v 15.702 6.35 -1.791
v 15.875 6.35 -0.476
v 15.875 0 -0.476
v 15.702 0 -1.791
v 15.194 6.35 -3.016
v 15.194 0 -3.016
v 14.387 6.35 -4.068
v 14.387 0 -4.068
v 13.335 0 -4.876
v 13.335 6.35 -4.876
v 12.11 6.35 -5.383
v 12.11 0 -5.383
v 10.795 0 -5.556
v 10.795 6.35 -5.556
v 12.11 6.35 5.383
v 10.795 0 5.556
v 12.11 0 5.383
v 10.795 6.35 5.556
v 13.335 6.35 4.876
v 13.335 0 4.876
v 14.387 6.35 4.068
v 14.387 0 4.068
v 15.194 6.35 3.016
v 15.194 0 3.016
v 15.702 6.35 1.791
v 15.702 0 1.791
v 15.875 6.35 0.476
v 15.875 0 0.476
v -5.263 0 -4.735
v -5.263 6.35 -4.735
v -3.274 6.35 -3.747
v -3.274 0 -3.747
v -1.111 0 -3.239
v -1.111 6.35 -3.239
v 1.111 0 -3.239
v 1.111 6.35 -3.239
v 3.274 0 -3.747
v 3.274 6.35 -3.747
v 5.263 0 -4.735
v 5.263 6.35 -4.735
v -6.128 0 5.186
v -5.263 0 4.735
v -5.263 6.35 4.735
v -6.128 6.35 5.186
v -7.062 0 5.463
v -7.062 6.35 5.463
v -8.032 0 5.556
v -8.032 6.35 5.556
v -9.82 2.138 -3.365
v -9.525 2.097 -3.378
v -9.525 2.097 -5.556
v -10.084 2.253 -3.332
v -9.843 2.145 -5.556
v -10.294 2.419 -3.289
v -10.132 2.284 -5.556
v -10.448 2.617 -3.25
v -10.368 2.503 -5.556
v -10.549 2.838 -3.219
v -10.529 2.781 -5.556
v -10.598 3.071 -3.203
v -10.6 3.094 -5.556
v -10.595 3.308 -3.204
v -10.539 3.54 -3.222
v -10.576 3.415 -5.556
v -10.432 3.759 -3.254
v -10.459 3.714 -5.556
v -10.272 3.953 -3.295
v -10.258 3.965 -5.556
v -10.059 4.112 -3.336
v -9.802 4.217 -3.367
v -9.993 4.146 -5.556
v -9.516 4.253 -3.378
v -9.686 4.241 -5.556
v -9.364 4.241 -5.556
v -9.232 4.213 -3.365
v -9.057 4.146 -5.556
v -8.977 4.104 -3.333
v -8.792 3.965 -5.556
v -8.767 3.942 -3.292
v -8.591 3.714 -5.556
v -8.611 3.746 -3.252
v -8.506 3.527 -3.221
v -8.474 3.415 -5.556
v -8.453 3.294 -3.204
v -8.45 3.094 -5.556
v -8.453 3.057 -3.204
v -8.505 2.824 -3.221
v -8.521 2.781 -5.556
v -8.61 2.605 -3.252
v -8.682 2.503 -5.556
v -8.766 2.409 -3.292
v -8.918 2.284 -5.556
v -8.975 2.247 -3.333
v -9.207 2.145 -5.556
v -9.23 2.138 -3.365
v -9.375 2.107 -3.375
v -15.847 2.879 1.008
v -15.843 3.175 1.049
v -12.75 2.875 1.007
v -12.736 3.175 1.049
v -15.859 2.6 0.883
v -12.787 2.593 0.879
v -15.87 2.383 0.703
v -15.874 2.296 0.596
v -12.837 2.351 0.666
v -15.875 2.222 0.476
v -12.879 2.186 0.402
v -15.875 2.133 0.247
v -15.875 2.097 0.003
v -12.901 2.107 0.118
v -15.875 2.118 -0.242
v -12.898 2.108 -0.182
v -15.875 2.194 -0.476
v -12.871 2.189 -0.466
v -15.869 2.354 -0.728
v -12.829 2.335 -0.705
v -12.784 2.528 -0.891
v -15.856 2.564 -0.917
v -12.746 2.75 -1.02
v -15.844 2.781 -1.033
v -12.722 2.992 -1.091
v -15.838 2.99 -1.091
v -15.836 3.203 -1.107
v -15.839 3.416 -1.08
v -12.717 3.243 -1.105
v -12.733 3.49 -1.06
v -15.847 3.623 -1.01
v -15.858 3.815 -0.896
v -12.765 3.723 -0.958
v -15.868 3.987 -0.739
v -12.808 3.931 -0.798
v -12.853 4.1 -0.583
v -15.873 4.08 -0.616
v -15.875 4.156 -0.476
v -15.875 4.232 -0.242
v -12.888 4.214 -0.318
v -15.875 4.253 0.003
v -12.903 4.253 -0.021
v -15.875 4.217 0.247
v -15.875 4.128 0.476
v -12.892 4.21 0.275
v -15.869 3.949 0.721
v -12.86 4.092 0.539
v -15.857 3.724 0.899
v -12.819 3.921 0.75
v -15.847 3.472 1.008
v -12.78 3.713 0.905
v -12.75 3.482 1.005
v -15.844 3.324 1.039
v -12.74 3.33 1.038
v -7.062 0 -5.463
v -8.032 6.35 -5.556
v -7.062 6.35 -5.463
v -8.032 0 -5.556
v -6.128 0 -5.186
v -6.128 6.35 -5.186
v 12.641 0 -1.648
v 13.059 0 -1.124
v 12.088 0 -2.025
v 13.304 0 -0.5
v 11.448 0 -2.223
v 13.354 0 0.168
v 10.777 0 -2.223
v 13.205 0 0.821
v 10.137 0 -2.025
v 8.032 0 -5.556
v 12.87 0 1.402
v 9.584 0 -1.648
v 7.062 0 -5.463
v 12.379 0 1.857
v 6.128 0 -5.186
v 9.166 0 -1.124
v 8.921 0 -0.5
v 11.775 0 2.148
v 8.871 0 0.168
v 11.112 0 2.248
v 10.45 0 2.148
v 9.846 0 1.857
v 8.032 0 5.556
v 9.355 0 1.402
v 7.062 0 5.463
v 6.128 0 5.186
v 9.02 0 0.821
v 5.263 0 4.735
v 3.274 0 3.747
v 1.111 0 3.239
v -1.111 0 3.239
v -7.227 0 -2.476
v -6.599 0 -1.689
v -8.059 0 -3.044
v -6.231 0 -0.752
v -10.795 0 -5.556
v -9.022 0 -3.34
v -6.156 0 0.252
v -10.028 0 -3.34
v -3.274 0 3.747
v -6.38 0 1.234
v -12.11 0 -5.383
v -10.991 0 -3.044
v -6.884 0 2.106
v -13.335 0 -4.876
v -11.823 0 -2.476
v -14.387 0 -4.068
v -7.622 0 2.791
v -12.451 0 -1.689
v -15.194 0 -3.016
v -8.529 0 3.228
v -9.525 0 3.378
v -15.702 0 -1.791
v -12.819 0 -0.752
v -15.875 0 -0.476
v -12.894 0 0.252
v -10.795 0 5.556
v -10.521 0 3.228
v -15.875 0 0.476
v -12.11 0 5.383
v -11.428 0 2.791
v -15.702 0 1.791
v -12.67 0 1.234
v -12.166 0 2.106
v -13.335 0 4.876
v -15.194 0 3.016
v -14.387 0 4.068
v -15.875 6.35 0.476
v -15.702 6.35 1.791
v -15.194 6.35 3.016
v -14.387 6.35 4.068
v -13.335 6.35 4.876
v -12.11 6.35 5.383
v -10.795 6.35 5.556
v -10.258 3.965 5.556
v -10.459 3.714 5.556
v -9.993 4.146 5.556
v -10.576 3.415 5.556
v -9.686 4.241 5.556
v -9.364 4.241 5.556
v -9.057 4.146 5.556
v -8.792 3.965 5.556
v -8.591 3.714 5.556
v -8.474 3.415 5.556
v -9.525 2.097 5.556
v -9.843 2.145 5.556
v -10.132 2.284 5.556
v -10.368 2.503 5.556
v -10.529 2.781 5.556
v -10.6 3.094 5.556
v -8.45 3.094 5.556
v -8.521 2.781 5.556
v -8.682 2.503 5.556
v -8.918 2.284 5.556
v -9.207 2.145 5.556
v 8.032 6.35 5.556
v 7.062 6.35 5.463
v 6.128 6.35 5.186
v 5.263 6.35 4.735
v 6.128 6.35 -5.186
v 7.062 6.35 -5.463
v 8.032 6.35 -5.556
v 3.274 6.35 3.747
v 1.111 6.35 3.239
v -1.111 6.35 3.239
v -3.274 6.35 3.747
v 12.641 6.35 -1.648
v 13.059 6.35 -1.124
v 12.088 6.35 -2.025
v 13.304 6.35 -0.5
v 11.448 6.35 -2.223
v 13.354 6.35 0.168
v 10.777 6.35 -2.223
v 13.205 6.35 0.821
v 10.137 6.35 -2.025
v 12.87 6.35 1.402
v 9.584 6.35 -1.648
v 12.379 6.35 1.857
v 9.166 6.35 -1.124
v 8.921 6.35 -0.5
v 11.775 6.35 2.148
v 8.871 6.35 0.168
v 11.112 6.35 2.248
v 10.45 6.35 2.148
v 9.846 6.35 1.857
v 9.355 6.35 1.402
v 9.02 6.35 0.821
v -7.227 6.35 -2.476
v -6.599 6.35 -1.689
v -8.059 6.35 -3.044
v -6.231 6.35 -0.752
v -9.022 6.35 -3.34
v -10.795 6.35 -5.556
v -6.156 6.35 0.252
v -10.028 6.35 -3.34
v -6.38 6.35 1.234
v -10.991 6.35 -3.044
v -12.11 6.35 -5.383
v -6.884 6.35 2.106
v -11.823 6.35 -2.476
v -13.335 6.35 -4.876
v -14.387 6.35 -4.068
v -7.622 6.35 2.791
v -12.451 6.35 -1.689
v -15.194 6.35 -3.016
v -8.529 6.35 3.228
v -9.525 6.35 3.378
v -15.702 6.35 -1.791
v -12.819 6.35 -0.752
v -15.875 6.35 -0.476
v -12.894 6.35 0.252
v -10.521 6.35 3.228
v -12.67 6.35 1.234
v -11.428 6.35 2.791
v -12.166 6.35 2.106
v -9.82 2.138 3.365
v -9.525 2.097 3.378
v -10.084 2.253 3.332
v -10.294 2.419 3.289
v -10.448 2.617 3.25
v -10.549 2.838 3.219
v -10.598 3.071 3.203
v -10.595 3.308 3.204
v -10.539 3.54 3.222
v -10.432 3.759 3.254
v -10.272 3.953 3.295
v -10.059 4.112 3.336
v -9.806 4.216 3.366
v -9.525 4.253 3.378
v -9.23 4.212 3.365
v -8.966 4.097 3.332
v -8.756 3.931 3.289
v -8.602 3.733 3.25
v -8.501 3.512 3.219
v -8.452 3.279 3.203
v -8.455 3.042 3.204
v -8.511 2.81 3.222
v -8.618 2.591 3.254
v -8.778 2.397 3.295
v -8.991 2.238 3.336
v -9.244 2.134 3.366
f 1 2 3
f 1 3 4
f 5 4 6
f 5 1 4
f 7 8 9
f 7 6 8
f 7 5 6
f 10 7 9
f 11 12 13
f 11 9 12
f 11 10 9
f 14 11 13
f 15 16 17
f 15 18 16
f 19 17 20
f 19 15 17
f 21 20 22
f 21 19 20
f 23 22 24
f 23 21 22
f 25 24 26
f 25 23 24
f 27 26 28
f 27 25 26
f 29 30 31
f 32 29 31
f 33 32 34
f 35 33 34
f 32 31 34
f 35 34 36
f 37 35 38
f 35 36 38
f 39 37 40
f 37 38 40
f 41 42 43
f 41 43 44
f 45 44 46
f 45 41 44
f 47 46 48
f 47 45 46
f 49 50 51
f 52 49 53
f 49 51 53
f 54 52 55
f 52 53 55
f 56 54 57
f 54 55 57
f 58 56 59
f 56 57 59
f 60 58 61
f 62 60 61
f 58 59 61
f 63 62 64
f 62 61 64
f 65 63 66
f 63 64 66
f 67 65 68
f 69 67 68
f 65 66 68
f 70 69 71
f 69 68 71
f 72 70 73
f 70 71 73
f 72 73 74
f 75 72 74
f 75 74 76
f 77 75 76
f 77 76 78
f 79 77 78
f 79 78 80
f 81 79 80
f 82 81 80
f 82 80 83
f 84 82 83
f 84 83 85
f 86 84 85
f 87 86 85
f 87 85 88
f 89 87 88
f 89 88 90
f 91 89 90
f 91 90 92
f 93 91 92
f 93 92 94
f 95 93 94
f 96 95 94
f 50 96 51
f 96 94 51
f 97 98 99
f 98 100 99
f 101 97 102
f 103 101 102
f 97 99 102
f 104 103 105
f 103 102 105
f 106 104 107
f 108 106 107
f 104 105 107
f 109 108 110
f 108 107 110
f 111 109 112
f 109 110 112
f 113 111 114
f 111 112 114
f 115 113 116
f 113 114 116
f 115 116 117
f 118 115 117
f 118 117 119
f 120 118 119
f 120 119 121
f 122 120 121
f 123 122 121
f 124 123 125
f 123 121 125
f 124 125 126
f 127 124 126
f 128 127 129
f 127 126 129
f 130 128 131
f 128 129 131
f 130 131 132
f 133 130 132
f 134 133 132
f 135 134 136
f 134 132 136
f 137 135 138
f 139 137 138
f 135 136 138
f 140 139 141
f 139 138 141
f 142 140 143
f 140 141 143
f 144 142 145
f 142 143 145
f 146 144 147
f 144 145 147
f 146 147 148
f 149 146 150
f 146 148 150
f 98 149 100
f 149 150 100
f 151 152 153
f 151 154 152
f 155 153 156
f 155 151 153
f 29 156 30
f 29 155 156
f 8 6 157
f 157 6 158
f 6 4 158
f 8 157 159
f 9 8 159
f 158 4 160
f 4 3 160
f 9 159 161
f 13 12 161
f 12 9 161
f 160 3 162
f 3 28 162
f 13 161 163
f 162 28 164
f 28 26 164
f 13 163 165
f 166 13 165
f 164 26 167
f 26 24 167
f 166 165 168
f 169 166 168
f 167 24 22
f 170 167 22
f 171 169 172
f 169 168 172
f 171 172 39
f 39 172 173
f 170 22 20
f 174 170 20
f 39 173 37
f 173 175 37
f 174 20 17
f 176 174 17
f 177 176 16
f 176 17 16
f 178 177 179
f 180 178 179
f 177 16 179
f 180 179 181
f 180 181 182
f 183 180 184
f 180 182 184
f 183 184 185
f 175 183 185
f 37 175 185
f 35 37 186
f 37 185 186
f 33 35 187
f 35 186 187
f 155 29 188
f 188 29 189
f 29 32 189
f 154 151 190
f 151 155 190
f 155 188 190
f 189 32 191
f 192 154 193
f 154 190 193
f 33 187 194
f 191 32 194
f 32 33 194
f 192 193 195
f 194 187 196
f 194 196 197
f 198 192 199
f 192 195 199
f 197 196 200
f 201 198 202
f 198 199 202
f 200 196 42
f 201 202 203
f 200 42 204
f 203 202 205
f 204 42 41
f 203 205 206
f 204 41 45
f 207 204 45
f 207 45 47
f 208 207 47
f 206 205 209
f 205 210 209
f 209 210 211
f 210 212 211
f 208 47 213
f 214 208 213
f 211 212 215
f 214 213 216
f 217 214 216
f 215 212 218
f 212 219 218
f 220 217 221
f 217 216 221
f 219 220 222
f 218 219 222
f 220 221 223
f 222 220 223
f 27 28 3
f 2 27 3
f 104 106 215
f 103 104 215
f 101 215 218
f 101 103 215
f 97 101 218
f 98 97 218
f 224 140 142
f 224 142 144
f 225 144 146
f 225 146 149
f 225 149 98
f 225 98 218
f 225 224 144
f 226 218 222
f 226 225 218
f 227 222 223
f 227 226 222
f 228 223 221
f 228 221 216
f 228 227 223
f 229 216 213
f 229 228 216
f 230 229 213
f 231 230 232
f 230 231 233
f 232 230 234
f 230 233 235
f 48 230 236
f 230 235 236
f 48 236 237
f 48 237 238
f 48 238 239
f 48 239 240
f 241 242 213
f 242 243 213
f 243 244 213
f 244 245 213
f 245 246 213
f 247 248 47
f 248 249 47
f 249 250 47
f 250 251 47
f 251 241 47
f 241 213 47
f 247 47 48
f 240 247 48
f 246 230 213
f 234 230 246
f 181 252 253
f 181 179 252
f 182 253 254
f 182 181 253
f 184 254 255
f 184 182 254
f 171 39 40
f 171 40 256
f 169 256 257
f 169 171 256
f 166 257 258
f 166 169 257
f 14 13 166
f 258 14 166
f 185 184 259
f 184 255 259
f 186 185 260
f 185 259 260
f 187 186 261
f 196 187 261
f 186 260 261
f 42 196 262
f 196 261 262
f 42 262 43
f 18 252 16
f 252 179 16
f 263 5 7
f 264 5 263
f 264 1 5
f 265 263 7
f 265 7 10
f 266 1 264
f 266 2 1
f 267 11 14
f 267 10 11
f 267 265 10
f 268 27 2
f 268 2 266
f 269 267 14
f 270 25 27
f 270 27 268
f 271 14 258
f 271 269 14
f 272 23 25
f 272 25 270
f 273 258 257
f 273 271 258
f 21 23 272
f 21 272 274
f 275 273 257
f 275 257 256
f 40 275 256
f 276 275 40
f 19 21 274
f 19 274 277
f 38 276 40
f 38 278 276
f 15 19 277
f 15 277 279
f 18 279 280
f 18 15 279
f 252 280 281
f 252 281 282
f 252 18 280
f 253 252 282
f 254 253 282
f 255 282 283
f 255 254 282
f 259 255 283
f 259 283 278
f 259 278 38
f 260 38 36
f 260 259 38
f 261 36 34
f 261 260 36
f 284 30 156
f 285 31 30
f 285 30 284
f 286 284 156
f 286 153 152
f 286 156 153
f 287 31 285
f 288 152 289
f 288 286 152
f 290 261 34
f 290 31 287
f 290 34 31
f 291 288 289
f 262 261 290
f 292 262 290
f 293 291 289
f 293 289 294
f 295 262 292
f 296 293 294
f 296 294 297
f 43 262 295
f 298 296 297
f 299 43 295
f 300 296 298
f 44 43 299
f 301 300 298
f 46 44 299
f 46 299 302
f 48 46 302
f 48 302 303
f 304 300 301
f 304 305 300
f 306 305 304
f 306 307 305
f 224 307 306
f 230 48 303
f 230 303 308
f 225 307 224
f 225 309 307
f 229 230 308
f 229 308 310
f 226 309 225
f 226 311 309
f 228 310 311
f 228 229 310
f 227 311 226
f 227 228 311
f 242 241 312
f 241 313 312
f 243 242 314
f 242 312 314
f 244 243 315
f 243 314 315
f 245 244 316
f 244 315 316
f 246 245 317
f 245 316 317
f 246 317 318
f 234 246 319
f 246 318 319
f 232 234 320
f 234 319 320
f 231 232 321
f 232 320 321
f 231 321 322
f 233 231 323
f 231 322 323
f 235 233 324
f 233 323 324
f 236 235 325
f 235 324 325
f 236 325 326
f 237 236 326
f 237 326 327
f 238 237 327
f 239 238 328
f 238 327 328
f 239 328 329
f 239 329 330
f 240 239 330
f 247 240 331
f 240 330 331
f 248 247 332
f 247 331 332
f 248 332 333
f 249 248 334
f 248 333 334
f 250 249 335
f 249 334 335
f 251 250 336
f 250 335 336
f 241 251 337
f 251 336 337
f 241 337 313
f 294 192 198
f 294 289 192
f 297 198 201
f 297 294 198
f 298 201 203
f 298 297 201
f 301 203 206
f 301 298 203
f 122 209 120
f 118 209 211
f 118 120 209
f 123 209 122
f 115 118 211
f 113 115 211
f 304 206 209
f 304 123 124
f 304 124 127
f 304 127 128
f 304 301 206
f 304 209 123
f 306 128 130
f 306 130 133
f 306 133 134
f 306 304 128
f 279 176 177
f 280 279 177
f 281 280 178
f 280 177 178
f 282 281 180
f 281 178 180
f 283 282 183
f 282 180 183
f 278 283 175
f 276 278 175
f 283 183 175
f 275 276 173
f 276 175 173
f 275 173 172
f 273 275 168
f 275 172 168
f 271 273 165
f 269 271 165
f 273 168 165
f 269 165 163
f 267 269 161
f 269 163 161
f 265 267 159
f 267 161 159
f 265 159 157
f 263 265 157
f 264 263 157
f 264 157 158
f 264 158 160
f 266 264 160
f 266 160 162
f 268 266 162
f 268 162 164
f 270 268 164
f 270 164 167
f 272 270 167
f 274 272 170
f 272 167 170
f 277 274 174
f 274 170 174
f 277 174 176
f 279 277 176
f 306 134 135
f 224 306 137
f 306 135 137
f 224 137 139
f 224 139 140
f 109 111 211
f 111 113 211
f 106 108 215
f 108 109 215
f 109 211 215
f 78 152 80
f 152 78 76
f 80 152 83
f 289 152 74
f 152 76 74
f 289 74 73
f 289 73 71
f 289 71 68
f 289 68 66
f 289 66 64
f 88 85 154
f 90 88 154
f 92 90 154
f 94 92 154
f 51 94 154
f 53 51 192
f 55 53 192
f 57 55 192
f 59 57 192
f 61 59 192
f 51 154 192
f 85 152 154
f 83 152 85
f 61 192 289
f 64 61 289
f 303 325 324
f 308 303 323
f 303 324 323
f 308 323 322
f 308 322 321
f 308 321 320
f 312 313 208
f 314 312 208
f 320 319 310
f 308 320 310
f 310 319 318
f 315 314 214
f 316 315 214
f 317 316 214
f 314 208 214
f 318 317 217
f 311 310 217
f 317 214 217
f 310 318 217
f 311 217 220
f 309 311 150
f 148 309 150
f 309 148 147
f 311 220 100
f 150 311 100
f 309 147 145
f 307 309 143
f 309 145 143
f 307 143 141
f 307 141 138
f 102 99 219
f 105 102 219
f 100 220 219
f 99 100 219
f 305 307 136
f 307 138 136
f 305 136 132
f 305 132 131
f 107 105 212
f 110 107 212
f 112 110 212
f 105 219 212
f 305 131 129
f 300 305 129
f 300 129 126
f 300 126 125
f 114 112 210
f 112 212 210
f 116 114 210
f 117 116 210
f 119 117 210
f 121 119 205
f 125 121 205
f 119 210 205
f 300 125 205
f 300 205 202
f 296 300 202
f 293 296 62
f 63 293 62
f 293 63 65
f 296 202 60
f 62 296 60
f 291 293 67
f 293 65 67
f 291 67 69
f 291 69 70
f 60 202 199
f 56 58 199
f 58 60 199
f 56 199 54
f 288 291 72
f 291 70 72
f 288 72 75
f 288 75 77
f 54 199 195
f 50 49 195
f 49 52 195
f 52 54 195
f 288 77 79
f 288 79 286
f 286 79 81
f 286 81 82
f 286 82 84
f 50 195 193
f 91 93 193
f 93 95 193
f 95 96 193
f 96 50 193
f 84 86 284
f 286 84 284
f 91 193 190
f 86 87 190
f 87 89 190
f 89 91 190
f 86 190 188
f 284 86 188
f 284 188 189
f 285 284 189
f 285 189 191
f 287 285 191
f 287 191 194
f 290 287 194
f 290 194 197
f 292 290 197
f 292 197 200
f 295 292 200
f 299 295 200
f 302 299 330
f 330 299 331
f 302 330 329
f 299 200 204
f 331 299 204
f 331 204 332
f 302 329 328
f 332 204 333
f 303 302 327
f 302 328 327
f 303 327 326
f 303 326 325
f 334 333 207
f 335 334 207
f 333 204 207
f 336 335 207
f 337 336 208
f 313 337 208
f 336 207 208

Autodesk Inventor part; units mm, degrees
ref_plane "YZ Plane" through (0, 0, 0) normal (1, 0, 0) x (0, 1, 0)
ref_plane "XZ Plane" through (0, 0, 0) normal (0, 1, 0) x (-1, 0, 0)
ref_plane "XY Plane" through (0, 0, 0) normal (0, 0, 1) x (1, 0, 0)
sketch "Sketch1" plane through (0, 0, 0) normal (0, 1, 0) x (-1, 0, 0)
  line L0 (15.875, 5.5563) -> (-15.875, 5.5563)
  line L1 (-15.875, 5.5563) -> (-15.875, -5.5563)
  line L2 (-15.875, -5.5563) -> (15.875, -5.5563)
  line L3 (15.875, -5.5563) -> (15.875, 5.5563)
  point P0 (0, 0)
  dimension "d0" = 31.75
  dimension "d1" = 11.1125
extrude "Extrusion1" add sketch "Sketch1" along normal blind 6.35
sketch "Sketch2" plane through (0, 6.35, 0) normal (0, 1, 0) x (1, 0, 0)
  line L0 (15.875, -5.5563) -> (15.875, 5.5563) projected
  line L1 (15.875, 5.5563) -> (-15.875, 5.5563) projected
  point P0 (0, 0)
  point P1 (11.1125, 0)
  dimension "d4" = 4.7625
  dimension "d5" = 5.5563
hole "Hole1" at (11.1125, 6.35, 0) direction (0, -1, 0) diameter 4.4958 end through all clearance for "Flat Head Machine Screw (82)" size "#8" standard "Ansi Unified Screw Threads"
sketch "Sketch3" plane through (0, 6.35, 0) normal (0, 1, 0) x (1, 0, 0)
  line L0 (-15.875, 5.5563) -> (-15.875, -5.5563) projected
  line L1 (15.875, 5.5563) -> (-15.875, 5.5563) projected
  point P0 (0, 0)
  point P1 (-9.525, 0)
  dimension "d13" = 6.35
  dimension "d14" = 5.5563
hole "Hole2" at (-9.525, 6.35, 0) direction (0, -1, 0) diameter 6.7564 end through all clearance for "Flat Head Machine Screw (82)" size "1/4" standard "Ansi Unified Screw Threads"
fillet "Fillet1" radius 5.08 4 edges at (15.875, 3.175, -5.5563) (15.875, 3.175, 5.5563) (-15.875, 3.175, -5.5563) (-15.875, 3.175, 5.5563)
sketch "Sketch4" plane through (0, 6.35, 0) normal (0, 1, 0) x (1, 0, 0)
  line L0 (-10.795, -5.5563) -> (10.795, -5.5563) projected
  arc A0 (6.35, -5.5563) -> (-6.35, -5.5563) centre (0, -12.8323) ccw
  line L1 (10.795, 5.5563) -> (-10.795, 5.5563) projected
  arc A1 (-6.35, 5.5563) -> (6.35, 5.5563) centre (0, 12.8323) ccw
  point P0 (0, 0)
  dimension "d23" = 12.7
  dimension "d24" = 12.7
extrude "Extrusion2" cut sketch "Sketch4" against normal blind 6.35
fillet "Fillet2" radius 5.08 4 edges at (-6.35, 3.175, -5.5563) (6.35, 3.175, -5.5563) (-6.35, 3.175, 5.5563) (6.35, 3.175, 5.5563)
sketch "Sketch5" plane through (-10.795, 0, 5.5563) normal (0, 0, 1) x (1, 0, 0)
  line L0 (0, 6.35) -> (2.7628, 6.35) projected
  line L1 (-5.08, 6.35) -> (-5.08, 0) projected
  point P0 (10.795, 0)
  point P1 (1.27, 3.175)
  dimension "d28" = 3.175
  dimension "d29" = 6.35
hole "Hole3" at (-9.525, 3.175, 5.5563) direction (0, 0, -1) diameter 2.1565 end through all thread size "4-40 UNC" class "2B" standard "ANSI Unified Screw Threads"
sketch "Sketch6" plane through (-15.875, 0, -0.4763) normal (-1, 0, 0) x (0, 0, 1)
  line L0 (0, 6.35) -> (0.9525, 6.35) projected
  line L1 (-5.08, 6.35) -> (-5.08, 0) projected
  point P0 (0.4763, 0)
  point P1 (0.4474, 3.175)
  dimension "d37" = 3.175
  dimension "d38" = 5.5274
hole "Hole4" at (-15.875, 3.175, -0.0288) direction (1, 0, 0) diameter 2.1565 end up to surface thread size "4-40 UNC" class "2B" standard "ANSI Unified Screw Threads"
properties part number "Tube to TRB1 adapter"
